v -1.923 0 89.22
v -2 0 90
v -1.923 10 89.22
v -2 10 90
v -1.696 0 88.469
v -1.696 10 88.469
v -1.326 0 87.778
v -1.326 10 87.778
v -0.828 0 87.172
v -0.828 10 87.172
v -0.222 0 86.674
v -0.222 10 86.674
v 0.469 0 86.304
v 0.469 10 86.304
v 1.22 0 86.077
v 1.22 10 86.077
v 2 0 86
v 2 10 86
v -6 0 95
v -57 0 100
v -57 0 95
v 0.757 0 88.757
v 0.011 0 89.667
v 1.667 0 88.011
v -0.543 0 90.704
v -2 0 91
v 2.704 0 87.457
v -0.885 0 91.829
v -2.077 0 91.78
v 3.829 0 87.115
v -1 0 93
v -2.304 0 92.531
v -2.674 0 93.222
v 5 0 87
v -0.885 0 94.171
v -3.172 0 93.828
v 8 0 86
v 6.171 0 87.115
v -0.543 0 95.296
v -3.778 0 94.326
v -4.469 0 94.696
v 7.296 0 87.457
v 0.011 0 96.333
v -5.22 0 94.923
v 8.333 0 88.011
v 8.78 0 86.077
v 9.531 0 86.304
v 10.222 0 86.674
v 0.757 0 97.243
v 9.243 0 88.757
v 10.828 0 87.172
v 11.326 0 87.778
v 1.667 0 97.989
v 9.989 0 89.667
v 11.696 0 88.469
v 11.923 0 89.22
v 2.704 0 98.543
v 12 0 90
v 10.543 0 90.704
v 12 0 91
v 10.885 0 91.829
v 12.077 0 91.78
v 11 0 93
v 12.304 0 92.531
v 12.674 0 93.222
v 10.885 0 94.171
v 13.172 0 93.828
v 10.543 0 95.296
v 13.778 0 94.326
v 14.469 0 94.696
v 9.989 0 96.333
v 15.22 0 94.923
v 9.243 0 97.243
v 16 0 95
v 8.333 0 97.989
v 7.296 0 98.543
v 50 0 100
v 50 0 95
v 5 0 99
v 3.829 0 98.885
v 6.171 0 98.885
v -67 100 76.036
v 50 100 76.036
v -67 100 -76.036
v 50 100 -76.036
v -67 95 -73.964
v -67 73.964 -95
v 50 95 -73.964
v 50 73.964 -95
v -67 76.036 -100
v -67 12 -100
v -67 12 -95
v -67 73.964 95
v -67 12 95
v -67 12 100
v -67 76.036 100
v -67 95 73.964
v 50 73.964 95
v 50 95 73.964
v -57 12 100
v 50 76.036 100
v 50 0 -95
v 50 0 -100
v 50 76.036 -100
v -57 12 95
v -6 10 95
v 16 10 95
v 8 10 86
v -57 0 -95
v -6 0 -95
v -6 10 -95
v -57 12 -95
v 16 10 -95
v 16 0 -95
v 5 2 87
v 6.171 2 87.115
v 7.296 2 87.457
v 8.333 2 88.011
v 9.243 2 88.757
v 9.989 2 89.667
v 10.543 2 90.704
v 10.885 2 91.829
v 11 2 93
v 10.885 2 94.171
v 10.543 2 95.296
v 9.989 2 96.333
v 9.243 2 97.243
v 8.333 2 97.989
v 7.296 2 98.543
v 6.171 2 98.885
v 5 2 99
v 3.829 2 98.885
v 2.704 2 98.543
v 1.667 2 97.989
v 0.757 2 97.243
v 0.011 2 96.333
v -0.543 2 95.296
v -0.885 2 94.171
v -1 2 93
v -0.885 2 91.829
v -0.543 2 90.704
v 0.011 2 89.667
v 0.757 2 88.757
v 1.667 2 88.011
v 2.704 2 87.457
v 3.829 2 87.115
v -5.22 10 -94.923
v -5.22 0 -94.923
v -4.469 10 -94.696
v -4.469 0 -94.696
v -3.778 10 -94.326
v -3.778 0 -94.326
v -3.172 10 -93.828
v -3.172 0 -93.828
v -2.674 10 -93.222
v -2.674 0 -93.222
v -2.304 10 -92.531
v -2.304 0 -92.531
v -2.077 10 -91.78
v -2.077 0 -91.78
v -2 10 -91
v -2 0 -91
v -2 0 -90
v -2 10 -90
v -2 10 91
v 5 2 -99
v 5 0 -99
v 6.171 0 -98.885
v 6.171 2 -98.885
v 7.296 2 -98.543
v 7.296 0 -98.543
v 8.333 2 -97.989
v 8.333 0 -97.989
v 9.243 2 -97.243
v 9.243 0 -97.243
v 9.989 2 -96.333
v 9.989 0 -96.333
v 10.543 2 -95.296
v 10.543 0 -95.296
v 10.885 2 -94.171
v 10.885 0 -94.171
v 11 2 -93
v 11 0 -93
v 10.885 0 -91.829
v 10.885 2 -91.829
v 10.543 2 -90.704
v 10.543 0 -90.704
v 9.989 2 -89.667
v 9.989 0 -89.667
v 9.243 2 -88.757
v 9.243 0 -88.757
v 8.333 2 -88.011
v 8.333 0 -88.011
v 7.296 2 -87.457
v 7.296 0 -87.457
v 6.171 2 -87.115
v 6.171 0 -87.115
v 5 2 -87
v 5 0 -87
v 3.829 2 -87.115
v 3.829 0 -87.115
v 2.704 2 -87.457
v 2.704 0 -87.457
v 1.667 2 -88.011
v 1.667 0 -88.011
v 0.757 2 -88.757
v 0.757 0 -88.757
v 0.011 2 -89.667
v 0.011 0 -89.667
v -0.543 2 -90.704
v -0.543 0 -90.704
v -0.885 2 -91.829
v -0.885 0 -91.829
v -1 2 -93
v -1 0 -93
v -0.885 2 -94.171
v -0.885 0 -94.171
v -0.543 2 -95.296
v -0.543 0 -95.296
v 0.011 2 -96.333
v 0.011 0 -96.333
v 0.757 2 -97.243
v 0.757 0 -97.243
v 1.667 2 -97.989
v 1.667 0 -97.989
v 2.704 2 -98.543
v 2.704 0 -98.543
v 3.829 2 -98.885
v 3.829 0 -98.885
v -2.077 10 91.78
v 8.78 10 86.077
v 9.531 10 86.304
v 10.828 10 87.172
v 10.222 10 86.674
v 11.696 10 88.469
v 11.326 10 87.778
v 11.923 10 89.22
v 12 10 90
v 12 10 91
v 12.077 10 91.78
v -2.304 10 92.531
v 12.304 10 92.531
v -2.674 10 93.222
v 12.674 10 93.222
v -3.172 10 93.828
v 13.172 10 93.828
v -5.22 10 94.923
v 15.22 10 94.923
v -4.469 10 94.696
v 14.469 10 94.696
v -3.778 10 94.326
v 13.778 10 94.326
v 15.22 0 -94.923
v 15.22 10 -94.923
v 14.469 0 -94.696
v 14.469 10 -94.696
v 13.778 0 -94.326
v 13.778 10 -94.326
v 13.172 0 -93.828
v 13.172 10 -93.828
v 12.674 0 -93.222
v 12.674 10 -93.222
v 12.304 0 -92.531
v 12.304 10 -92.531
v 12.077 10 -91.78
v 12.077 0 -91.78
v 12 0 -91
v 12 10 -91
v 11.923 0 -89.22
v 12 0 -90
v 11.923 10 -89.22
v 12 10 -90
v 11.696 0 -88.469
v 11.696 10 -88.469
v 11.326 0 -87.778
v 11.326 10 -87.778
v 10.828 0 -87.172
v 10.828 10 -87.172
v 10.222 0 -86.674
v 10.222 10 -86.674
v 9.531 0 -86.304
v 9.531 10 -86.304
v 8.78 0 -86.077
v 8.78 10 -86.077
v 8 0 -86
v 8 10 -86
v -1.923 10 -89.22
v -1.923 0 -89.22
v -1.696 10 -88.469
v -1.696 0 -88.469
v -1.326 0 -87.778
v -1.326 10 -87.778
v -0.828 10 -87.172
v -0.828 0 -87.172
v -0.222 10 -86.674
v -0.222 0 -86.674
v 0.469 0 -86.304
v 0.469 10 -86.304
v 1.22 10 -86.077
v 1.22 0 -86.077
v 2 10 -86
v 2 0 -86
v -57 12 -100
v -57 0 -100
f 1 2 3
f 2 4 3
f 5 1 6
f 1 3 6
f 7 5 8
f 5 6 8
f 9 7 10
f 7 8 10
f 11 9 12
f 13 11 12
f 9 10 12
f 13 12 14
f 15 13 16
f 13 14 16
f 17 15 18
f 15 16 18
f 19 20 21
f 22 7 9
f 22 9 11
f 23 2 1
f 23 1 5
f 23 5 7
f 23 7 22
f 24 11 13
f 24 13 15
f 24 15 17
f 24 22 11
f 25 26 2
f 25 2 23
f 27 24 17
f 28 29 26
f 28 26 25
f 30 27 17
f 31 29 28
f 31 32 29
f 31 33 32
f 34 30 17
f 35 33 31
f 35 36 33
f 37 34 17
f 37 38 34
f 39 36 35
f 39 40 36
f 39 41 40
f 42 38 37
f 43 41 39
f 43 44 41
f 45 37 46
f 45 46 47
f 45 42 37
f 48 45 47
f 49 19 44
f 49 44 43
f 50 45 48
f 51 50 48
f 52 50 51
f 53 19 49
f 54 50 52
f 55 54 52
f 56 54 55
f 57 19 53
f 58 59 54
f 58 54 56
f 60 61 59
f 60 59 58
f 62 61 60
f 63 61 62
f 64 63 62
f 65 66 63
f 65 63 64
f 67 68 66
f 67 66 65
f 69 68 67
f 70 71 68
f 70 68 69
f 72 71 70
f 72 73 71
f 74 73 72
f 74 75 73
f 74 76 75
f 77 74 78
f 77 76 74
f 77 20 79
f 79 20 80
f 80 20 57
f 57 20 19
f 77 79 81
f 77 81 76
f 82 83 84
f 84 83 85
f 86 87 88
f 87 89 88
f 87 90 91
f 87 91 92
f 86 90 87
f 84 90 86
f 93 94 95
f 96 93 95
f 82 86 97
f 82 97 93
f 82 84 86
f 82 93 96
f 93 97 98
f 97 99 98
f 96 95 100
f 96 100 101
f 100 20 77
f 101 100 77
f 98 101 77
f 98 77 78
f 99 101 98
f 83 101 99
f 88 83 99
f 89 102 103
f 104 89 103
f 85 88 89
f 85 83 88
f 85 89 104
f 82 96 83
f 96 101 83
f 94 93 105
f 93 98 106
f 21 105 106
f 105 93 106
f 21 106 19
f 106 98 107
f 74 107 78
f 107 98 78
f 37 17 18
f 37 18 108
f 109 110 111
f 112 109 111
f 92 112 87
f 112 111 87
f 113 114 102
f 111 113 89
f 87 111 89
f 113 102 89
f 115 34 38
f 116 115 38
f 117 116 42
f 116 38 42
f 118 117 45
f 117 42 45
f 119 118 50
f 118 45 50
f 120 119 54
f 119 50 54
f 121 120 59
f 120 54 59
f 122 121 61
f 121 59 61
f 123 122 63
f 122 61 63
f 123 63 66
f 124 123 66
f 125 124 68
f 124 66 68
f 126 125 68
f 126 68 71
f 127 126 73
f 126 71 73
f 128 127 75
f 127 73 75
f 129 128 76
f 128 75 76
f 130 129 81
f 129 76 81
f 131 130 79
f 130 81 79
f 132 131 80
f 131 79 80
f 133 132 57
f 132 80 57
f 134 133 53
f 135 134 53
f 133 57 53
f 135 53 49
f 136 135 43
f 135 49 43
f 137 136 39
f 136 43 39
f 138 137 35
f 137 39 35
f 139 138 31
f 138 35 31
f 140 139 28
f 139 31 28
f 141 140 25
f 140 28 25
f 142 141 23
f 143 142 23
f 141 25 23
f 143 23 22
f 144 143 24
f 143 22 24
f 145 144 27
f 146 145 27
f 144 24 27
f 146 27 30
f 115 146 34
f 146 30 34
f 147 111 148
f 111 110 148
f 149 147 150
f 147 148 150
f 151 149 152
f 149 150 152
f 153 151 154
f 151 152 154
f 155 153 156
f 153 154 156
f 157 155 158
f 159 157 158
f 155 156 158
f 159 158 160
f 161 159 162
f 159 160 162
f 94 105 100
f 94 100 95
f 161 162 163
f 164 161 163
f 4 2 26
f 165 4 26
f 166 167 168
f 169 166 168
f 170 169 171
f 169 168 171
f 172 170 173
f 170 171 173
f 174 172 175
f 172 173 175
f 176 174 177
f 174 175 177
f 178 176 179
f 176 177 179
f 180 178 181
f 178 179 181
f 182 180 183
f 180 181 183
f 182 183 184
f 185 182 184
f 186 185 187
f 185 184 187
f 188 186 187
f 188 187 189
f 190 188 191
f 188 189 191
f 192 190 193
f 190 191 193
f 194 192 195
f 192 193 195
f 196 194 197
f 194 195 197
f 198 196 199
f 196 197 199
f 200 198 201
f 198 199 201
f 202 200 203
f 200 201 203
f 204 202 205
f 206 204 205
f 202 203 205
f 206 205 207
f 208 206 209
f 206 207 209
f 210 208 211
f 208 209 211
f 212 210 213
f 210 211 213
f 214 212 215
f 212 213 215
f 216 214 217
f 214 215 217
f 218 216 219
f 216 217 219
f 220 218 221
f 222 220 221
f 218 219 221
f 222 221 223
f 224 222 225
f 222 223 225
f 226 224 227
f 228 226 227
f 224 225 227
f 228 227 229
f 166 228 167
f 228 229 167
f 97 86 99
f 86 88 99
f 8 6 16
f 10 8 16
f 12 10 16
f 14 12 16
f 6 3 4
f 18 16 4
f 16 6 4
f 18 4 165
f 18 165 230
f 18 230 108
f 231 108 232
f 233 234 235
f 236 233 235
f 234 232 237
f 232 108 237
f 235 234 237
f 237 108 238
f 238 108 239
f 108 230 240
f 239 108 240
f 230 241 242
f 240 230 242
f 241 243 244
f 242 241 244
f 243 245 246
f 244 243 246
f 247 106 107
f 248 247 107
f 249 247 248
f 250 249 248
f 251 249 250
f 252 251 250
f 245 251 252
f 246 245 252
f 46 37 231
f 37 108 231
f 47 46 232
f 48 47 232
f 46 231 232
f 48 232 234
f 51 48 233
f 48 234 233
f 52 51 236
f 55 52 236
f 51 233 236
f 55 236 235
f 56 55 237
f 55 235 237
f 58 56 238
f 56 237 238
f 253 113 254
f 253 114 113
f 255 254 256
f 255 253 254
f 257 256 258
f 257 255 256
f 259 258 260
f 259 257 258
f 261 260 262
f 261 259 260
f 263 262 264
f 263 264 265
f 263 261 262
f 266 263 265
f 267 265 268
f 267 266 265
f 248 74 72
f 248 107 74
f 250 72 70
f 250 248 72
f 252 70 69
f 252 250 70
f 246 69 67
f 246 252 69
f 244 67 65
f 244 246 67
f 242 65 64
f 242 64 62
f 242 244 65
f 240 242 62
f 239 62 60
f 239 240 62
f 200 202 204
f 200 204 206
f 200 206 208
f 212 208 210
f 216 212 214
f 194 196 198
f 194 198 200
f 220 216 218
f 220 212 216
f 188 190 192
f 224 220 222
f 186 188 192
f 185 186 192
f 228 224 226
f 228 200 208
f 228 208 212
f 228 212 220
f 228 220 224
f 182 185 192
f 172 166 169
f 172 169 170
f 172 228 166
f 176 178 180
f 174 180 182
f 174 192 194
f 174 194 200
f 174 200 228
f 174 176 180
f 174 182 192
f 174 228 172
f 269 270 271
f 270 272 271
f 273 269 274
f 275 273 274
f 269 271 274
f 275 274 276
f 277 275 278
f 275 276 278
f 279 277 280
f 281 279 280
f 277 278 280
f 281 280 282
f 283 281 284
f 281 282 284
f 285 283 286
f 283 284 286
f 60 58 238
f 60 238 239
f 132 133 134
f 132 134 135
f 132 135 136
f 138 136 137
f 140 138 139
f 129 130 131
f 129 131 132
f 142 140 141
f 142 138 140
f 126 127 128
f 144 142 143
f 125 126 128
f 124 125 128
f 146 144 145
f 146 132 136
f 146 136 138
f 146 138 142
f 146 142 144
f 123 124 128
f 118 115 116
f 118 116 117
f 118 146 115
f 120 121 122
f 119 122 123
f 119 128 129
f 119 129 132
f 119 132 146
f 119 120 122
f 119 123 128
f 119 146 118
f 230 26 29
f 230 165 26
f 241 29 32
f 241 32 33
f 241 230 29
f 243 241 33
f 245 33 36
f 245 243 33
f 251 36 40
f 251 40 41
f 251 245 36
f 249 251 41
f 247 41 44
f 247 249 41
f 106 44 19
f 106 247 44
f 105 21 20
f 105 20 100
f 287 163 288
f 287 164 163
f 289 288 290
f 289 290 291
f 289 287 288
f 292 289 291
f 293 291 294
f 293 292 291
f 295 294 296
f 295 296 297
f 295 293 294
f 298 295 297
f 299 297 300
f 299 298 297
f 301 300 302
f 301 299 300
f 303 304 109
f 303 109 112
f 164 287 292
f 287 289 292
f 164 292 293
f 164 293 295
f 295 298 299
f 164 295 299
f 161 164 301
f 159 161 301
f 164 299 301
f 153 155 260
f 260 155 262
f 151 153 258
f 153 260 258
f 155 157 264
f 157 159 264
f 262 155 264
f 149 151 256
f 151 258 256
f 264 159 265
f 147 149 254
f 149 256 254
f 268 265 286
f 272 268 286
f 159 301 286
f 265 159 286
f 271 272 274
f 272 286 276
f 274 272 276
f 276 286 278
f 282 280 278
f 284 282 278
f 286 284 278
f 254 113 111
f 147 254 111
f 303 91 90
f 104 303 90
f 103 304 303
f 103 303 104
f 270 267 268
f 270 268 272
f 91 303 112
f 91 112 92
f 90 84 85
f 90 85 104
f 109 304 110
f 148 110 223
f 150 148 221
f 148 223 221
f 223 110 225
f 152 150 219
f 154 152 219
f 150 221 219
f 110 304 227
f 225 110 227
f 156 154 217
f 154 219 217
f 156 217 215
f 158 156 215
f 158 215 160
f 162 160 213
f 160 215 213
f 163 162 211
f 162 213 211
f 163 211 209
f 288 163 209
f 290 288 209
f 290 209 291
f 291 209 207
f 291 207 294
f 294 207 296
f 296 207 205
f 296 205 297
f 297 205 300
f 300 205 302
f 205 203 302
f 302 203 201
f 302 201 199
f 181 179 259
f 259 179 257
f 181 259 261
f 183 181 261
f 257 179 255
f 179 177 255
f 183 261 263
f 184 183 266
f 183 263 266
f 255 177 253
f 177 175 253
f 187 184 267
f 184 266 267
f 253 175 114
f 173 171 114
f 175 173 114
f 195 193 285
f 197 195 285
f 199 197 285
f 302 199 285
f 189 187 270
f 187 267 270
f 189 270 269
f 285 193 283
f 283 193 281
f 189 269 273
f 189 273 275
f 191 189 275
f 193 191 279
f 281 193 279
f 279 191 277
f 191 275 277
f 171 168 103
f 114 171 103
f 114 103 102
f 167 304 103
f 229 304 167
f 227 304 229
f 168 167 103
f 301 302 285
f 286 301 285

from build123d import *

# Parameters (mm, degrees)
SKETCH1_W           = 100
SKETCH1_H           = 5
BOSS_EXTRUDE1_DEPTH = 17
SKETCH6_W           = 10
SKETCH6_H           = 12
CUT_EXTRUDE1_DEPTH  = 234.428789998
SKETCH7_W           = 14
SKETCH7_H           = 14
BOSS_EXTRUDE2_DEPTH = 10
SKETCH8_R           = 6
CUT_EXTRUDE2_DEPTH  = 2
FILLET1_R           = 4
SKETCH9_W           = 14
SKETCH9_H           = 14
BOSS_EXTRUDE3_DEPTH = 10
SKETCH10_R          = 6
CUT_EXTRUDE3_DEPTH  = 2
FILLET2_R           = 4


with BuildPart() as part:
    # Sweep3: sweep along a path in Sketch2
    with BuildLine(Plane(origin=(0, 0, 0), x_dir=(0, 0, -1), z_dir=(1, 0, 0))) as sweep3_path:
        Line((-97.5, 0), (-97.5, 75))
        Line((-97.5, 75), (-75, 97.5))
        Line((-75, 97.5), (75, 97.5))
        Line((75, 97.5), (97.5, 75))
        Line((97.5, 75), (97.5, 0))
    # Sketch1 → Sweep3 (sweep)
    with BuildSketch(Plane(origin=(0, 0, 0), x_dir=(1, 0, 0), z_dir=(0, 1, 0))):
        with Locations((0, -97.5)):
            Rectangle(SKETCH1_W, SKETCH1_H)
    sweep(path=sweep3_path.line, transition=Transition.RIGHT)

    # Sketch5 → Boss-Extrude1 (add)
    with BuildSketch(Plane.ZY.offset(50)):
        Polygon((-100, 0), (-95, 0), (-95, 73.964466094), (-73.964466094, 95), (73.964466094, 95), (95, 73.964466094), (95, 0), (100, 0), (100, 76.035533906), (76.035533906, 100), (-76.035533906, 100), (-100, 76.035533906), align=None)
    extrude(amount=BOSS_EXTRUDE1_DEPTH)

    # Sketch6 → Cut-Extrude1 (cut, through all)
    with BuildSketch(Plane(origin=(0, 0, -100), x_dir=(-1, 0, 0), z_dir=(0, 0, -1))):
        with Locations((62, 6)):
            Rectangle(SKETCH6_W, SKETCH6_H)
    extrude(amount=-CUT_EXTRUDE1_DEPTH, mode=Mode.SUBTRACT)

    # Sketch7 → Boss-Extrude2 (add)
    with BuildSketch(Plane.XZ):
        with Locations((5, 93)):
            Rectangle(SKETCH7_W, SKETCH7_H)
    extrude(amount=-BOSS_EXTRUDE2_DEPTH)

    # Sketch8 → Cut-Extrude2 (cut)
    with BuildSketch(Plane.XZ):
        with Locations(Location((5, 93, 0), (0, 0, 270))):
            Circle(SKETCH8_R)
    extrude(amount=-CUT_EXTRUDE2_DEPTH, mode=Mode.SUBTRACT)

    # Fillet1
    fillet1_edges = [part.edges().sort_by_distance(p)[0] for p in [
        (12, 5, 95),
        (-2, 5, 95),
        (-2, 5, 86),
        (12, 5, 86),
    ]]
    fillet(fillet1_edges, radius=FILLET1_R)

    # Sketch9 → Boss-Extrude3 (add)
    with BuildSketch(Plane.XZ):
        with Locations((5, -93)):
            Rectangle(SKETCH9_W, SKETCH9_H)
    extrude(amount=-BOSS_EXTRUDE3_DEPTH)

    # Sketch10 → Cut-Extrude3 (cut)
    with BuildSketch(Plane.XZ):
        with Locations(Location((5, -93, 0), (0, 0, 270))):
            Circle(SKETCH10_R)
    extrude(amount=-CUT_EXTRUDE3_DEPTH, mode=Mode.SUBTRACT)

    # Fillet2
    fillet2_edges = [part.edges().sort_by_distance(p)[0] for p in [
        (12, 5, -86),
        (-2, 5, -95),
        (-2, 5, -86),
        (12, 5, -95),
    ]]
    fillet(fillet2_edges, radius=FILLET2_R)


solid = part.part
